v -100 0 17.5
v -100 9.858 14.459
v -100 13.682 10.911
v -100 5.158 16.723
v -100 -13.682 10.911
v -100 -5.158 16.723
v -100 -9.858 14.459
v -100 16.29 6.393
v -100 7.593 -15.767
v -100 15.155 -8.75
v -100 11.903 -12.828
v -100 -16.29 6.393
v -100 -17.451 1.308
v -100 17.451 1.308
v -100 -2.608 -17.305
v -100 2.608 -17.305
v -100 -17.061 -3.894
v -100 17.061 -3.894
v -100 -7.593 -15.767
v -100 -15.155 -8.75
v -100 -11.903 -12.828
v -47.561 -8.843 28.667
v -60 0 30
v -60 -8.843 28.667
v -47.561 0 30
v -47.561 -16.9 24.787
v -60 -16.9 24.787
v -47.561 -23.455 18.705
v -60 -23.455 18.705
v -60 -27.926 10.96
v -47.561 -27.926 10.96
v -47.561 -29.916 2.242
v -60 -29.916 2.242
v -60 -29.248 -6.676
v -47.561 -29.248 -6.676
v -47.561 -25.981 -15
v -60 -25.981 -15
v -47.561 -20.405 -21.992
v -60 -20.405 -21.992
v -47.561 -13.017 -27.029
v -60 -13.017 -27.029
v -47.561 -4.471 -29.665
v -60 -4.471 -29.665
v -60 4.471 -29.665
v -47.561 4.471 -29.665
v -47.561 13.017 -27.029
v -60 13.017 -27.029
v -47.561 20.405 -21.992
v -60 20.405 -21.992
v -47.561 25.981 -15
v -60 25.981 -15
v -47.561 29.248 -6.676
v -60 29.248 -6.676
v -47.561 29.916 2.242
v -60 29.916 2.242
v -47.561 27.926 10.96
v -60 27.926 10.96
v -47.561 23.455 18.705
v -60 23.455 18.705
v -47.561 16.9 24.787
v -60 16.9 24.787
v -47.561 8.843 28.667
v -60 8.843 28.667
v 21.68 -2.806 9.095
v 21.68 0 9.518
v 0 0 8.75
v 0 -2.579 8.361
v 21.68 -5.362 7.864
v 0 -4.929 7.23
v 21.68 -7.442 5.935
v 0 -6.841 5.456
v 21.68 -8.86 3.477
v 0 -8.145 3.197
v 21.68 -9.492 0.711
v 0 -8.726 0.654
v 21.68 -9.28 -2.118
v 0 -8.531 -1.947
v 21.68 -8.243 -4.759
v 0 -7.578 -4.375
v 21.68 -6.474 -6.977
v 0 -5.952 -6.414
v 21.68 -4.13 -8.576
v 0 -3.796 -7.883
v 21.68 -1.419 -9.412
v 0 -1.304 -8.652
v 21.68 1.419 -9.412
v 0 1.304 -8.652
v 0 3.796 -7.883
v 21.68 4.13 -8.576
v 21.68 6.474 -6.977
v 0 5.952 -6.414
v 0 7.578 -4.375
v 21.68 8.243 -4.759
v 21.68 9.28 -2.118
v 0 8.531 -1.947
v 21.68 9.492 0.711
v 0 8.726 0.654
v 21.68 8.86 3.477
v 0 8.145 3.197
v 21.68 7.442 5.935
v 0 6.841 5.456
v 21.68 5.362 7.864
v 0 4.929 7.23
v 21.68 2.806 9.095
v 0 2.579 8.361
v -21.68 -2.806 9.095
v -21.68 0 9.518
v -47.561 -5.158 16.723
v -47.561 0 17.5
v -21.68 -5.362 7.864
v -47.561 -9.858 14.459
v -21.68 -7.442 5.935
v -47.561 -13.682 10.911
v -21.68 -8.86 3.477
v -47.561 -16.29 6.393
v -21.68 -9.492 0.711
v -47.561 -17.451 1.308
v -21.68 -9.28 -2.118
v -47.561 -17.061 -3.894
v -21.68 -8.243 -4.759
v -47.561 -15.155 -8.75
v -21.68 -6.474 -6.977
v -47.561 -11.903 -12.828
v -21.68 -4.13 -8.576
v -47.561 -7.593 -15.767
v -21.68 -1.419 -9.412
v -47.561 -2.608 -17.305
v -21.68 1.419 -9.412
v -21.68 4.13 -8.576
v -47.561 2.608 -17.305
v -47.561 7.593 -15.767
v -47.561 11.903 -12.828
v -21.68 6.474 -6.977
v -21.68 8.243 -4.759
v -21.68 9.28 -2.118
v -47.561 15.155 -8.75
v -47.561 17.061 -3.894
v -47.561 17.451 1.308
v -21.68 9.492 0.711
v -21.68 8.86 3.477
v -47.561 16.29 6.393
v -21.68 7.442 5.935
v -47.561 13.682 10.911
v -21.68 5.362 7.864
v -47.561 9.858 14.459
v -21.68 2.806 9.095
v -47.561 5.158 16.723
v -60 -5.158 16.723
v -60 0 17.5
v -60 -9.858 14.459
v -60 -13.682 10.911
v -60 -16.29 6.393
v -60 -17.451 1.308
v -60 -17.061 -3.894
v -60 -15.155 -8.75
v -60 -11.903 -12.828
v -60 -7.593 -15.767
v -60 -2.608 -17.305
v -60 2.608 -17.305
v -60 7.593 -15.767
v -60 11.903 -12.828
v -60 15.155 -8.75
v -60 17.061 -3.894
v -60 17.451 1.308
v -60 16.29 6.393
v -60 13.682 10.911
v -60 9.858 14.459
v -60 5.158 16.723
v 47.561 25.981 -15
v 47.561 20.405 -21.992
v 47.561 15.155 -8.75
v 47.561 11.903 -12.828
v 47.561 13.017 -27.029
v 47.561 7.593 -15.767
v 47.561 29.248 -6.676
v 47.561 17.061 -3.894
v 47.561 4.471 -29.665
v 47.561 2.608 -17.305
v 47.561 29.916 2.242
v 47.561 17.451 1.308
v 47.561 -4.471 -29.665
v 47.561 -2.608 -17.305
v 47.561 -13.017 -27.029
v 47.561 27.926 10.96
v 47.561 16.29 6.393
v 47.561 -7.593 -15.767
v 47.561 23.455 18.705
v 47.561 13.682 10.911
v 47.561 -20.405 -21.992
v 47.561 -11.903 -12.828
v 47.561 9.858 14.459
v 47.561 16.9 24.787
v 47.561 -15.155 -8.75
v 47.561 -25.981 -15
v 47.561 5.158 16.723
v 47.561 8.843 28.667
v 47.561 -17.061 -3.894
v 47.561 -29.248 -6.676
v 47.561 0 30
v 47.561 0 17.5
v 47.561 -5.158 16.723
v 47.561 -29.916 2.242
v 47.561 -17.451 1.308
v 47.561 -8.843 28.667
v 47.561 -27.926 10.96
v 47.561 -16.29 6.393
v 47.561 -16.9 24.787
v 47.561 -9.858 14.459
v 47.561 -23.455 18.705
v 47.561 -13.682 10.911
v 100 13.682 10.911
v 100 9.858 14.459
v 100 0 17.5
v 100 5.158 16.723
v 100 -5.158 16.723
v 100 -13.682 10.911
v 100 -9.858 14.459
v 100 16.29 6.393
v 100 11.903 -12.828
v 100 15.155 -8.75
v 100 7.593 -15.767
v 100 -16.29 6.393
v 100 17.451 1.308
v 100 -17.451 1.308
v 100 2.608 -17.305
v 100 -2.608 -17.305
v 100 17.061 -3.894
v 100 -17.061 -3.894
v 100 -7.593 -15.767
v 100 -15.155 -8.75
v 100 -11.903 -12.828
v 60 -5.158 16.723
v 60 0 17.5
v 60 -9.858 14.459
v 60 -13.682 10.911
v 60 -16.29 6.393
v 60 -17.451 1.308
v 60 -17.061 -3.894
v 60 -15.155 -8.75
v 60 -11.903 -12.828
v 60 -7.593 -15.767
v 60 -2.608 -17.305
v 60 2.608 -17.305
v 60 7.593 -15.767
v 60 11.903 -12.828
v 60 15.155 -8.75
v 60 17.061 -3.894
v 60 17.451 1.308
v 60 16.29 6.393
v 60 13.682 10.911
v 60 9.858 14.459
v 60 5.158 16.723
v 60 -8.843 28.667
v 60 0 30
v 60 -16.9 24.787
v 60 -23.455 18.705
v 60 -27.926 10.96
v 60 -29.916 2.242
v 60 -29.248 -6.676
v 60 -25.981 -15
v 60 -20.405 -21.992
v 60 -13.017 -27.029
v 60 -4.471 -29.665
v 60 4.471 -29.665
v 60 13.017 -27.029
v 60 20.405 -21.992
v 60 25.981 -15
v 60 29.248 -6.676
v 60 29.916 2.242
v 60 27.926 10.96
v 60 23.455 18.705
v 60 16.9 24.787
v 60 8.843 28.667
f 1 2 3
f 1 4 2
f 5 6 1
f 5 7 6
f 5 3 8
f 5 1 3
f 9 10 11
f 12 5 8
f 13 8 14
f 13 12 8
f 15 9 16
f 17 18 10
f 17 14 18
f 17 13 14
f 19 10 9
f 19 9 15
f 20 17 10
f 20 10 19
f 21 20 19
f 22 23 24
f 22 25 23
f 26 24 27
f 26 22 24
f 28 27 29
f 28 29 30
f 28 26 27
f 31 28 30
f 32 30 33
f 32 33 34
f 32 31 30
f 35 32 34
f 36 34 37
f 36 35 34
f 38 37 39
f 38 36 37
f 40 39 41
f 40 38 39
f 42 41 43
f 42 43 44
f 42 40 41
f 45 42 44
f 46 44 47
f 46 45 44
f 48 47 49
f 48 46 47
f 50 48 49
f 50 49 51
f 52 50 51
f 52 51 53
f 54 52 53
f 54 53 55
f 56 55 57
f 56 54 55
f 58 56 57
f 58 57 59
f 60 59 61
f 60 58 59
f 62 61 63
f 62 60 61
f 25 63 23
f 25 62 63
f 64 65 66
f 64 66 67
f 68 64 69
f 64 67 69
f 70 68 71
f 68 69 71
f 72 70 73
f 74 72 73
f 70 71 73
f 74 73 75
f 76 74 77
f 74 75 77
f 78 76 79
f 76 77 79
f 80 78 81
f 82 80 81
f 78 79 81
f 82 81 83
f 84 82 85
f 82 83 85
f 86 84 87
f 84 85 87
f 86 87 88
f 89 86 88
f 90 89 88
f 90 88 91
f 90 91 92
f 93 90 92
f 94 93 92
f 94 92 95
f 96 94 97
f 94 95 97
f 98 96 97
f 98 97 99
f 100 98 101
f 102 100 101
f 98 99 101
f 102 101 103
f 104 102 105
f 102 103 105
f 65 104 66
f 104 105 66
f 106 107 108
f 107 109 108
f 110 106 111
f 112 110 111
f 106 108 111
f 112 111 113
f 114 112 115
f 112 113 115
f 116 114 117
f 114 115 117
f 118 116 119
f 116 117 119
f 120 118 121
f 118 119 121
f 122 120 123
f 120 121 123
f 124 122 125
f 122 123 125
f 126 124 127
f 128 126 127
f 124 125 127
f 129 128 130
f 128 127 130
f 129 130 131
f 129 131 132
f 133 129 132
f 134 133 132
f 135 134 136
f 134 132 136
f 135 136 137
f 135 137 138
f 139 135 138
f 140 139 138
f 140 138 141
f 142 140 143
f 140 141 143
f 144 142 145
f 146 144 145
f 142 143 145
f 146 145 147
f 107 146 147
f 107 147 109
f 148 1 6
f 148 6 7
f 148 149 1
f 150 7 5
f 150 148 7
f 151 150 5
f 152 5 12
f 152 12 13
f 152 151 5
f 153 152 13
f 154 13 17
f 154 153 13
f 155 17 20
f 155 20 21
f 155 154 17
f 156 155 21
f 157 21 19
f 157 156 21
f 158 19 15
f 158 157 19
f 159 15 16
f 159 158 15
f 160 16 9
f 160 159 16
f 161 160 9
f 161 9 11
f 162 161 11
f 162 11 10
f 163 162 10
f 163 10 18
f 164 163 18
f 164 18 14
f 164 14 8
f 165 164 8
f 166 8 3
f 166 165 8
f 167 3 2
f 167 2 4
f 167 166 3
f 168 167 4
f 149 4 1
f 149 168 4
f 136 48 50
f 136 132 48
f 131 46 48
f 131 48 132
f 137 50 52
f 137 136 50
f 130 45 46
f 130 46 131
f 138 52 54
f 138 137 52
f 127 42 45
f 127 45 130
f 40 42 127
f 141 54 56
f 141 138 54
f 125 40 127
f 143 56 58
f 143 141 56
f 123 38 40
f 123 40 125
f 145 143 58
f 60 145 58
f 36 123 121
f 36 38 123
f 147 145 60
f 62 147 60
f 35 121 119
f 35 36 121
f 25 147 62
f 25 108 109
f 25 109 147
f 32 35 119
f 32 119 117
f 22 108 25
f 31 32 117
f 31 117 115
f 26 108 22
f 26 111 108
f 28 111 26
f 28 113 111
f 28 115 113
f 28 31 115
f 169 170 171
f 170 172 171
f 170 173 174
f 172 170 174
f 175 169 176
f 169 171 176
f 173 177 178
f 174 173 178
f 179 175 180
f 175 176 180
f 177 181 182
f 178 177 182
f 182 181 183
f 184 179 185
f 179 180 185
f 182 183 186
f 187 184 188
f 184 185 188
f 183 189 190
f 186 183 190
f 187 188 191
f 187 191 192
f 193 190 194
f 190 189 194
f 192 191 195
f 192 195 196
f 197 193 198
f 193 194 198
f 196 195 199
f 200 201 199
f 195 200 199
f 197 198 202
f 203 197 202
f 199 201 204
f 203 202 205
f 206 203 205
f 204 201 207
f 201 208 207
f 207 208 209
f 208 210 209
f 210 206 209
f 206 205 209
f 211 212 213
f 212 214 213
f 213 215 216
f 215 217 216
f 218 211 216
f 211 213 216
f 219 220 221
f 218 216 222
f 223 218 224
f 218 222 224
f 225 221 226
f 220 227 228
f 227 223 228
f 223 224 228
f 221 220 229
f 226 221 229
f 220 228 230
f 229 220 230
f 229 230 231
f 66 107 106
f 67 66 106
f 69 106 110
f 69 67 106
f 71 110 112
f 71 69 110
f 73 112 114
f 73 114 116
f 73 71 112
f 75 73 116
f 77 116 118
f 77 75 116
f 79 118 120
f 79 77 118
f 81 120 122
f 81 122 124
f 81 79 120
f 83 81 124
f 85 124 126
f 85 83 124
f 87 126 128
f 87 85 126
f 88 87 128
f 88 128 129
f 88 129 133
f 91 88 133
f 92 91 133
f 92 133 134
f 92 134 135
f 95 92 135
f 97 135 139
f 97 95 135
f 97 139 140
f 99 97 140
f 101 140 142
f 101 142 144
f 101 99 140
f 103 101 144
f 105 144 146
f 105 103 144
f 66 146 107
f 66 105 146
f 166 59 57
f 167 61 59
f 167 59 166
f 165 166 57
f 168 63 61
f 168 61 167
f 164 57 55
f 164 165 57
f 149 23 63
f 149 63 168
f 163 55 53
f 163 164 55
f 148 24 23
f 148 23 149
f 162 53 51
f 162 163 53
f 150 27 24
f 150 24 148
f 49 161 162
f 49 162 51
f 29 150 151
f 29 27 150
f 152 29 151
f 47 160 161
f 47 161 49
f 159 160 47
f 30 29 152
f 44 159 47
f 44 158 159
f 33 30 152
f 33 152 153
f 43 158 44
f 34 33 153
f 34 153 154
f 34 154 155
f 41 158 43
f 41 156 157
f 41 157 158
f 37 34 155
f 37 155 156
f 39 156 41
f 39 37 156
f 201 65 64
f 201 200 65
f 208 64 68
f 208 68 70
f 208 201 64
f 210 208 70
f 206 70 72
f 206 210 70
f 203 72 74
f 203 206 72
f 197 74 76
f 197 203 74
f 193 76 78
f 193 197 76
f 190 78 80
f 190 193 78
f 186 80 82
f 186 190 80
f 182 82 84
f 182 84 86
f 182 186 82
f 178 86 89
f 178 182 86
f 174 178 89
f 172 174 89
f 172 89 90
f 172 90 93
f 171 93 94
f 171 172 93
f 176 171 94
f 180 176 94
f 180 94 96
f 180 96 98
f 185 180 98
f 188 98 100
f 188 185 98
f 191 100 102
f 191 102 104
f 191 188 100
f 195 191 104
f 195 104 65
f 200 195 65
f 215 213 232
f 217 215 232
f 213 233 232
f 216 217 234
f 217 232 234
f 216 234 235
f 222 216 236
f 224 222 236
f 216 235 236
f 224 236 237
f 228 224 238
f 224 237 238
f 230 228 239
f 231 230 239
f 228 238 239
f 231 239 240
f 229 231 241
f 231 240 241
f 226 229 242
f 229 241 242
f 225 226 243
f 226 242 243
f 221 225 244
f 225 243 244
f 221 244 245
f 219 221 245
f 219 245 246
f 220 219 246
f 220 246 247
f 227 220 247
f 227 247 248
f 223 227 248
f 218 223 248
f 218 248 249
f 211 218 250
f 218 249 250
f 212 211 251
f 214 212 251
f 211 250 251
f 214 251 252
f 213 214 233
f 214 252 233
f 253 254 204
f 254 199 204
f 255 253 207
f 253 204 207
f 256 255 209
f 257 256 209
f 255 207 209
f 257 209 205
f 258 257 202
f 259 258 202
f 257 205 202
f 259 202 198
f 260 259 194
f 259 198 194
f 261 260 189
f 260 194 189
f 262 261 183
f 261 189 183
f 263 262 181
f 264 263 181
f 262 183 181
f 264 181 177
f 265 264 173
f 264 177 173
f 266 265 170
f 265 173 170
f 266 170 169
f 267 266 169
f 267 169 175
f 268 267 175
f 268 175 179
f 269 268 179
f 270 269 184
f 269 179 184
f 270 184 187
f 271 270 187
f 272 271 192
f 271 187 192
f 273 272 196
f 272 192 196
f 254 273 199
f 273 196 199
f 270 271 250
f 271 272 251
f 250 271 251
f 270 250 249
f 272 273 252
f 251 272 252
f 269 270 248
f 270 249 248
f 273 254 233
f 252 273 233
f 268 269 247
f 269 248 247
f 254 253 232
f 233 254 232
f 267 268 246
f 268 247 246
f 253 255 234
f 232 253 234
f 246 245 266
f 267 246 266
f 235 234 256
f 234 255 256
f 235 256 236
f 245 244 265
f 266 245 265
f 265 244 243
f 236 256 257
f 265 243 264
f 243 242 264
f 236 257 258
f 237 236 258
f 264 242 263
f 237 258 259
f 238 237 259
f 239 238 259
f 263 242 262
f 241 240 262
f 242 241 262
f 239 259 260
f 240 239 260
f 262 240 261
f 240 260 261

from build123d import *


with BuildPart() as f1:
    # F0 (on Front) → F1 (revolve)
    with BuildSketch(Plane.XZ):
        with BuildLine():
            Line((47.5609842221, 30), (47.5609842221, 17.5))
            add(Edge.make_bspline(
                [(21.6804631054, 9.5182526857), (30.3073034776, 12.1788351238), (38.9341438499, 14.8394175619), (47.5609842221, 17.5)],
                knots=[0, 0, 0, 0, 27.0833835305, 27.0833835305, 27.0833835305, 27.0833835305], degree=3))
            add(Edge.make_bspline(
                [(21.6804631054, 9.5182526857), (14.4536420703, 9.2621684571), (7.2268210351, 9.0060842286), (0, 8.75)],
                knots=[0, 0, 0, 0, 21.6940704492, 21.6940704492, 21.6940704492, 21.6940704492], degree=3))
            Line((0, 8.75), (0, 0))
            Line((0, 0), (100, 0))
            Line((100, 0), (100, 17.5))
            Line((100, 17.5), (60, 17.5))
            Line((60, 17.5), (60, 30))
            Line((60, 30), (47.5609842221, 30))
        make_face()
    revolve(axis=Axis((50, 0, 0), (1, 0, 0)))

    # F2: F1 across face


with BuildPart() as f1_1:
    add(f1.part)
    add(f1.part.mirror(Plane(origin=(0, 0, 0), x_dir=(0, -1, 0), z_dir=(-1, 0, 0))))


solid = f1_1.part
